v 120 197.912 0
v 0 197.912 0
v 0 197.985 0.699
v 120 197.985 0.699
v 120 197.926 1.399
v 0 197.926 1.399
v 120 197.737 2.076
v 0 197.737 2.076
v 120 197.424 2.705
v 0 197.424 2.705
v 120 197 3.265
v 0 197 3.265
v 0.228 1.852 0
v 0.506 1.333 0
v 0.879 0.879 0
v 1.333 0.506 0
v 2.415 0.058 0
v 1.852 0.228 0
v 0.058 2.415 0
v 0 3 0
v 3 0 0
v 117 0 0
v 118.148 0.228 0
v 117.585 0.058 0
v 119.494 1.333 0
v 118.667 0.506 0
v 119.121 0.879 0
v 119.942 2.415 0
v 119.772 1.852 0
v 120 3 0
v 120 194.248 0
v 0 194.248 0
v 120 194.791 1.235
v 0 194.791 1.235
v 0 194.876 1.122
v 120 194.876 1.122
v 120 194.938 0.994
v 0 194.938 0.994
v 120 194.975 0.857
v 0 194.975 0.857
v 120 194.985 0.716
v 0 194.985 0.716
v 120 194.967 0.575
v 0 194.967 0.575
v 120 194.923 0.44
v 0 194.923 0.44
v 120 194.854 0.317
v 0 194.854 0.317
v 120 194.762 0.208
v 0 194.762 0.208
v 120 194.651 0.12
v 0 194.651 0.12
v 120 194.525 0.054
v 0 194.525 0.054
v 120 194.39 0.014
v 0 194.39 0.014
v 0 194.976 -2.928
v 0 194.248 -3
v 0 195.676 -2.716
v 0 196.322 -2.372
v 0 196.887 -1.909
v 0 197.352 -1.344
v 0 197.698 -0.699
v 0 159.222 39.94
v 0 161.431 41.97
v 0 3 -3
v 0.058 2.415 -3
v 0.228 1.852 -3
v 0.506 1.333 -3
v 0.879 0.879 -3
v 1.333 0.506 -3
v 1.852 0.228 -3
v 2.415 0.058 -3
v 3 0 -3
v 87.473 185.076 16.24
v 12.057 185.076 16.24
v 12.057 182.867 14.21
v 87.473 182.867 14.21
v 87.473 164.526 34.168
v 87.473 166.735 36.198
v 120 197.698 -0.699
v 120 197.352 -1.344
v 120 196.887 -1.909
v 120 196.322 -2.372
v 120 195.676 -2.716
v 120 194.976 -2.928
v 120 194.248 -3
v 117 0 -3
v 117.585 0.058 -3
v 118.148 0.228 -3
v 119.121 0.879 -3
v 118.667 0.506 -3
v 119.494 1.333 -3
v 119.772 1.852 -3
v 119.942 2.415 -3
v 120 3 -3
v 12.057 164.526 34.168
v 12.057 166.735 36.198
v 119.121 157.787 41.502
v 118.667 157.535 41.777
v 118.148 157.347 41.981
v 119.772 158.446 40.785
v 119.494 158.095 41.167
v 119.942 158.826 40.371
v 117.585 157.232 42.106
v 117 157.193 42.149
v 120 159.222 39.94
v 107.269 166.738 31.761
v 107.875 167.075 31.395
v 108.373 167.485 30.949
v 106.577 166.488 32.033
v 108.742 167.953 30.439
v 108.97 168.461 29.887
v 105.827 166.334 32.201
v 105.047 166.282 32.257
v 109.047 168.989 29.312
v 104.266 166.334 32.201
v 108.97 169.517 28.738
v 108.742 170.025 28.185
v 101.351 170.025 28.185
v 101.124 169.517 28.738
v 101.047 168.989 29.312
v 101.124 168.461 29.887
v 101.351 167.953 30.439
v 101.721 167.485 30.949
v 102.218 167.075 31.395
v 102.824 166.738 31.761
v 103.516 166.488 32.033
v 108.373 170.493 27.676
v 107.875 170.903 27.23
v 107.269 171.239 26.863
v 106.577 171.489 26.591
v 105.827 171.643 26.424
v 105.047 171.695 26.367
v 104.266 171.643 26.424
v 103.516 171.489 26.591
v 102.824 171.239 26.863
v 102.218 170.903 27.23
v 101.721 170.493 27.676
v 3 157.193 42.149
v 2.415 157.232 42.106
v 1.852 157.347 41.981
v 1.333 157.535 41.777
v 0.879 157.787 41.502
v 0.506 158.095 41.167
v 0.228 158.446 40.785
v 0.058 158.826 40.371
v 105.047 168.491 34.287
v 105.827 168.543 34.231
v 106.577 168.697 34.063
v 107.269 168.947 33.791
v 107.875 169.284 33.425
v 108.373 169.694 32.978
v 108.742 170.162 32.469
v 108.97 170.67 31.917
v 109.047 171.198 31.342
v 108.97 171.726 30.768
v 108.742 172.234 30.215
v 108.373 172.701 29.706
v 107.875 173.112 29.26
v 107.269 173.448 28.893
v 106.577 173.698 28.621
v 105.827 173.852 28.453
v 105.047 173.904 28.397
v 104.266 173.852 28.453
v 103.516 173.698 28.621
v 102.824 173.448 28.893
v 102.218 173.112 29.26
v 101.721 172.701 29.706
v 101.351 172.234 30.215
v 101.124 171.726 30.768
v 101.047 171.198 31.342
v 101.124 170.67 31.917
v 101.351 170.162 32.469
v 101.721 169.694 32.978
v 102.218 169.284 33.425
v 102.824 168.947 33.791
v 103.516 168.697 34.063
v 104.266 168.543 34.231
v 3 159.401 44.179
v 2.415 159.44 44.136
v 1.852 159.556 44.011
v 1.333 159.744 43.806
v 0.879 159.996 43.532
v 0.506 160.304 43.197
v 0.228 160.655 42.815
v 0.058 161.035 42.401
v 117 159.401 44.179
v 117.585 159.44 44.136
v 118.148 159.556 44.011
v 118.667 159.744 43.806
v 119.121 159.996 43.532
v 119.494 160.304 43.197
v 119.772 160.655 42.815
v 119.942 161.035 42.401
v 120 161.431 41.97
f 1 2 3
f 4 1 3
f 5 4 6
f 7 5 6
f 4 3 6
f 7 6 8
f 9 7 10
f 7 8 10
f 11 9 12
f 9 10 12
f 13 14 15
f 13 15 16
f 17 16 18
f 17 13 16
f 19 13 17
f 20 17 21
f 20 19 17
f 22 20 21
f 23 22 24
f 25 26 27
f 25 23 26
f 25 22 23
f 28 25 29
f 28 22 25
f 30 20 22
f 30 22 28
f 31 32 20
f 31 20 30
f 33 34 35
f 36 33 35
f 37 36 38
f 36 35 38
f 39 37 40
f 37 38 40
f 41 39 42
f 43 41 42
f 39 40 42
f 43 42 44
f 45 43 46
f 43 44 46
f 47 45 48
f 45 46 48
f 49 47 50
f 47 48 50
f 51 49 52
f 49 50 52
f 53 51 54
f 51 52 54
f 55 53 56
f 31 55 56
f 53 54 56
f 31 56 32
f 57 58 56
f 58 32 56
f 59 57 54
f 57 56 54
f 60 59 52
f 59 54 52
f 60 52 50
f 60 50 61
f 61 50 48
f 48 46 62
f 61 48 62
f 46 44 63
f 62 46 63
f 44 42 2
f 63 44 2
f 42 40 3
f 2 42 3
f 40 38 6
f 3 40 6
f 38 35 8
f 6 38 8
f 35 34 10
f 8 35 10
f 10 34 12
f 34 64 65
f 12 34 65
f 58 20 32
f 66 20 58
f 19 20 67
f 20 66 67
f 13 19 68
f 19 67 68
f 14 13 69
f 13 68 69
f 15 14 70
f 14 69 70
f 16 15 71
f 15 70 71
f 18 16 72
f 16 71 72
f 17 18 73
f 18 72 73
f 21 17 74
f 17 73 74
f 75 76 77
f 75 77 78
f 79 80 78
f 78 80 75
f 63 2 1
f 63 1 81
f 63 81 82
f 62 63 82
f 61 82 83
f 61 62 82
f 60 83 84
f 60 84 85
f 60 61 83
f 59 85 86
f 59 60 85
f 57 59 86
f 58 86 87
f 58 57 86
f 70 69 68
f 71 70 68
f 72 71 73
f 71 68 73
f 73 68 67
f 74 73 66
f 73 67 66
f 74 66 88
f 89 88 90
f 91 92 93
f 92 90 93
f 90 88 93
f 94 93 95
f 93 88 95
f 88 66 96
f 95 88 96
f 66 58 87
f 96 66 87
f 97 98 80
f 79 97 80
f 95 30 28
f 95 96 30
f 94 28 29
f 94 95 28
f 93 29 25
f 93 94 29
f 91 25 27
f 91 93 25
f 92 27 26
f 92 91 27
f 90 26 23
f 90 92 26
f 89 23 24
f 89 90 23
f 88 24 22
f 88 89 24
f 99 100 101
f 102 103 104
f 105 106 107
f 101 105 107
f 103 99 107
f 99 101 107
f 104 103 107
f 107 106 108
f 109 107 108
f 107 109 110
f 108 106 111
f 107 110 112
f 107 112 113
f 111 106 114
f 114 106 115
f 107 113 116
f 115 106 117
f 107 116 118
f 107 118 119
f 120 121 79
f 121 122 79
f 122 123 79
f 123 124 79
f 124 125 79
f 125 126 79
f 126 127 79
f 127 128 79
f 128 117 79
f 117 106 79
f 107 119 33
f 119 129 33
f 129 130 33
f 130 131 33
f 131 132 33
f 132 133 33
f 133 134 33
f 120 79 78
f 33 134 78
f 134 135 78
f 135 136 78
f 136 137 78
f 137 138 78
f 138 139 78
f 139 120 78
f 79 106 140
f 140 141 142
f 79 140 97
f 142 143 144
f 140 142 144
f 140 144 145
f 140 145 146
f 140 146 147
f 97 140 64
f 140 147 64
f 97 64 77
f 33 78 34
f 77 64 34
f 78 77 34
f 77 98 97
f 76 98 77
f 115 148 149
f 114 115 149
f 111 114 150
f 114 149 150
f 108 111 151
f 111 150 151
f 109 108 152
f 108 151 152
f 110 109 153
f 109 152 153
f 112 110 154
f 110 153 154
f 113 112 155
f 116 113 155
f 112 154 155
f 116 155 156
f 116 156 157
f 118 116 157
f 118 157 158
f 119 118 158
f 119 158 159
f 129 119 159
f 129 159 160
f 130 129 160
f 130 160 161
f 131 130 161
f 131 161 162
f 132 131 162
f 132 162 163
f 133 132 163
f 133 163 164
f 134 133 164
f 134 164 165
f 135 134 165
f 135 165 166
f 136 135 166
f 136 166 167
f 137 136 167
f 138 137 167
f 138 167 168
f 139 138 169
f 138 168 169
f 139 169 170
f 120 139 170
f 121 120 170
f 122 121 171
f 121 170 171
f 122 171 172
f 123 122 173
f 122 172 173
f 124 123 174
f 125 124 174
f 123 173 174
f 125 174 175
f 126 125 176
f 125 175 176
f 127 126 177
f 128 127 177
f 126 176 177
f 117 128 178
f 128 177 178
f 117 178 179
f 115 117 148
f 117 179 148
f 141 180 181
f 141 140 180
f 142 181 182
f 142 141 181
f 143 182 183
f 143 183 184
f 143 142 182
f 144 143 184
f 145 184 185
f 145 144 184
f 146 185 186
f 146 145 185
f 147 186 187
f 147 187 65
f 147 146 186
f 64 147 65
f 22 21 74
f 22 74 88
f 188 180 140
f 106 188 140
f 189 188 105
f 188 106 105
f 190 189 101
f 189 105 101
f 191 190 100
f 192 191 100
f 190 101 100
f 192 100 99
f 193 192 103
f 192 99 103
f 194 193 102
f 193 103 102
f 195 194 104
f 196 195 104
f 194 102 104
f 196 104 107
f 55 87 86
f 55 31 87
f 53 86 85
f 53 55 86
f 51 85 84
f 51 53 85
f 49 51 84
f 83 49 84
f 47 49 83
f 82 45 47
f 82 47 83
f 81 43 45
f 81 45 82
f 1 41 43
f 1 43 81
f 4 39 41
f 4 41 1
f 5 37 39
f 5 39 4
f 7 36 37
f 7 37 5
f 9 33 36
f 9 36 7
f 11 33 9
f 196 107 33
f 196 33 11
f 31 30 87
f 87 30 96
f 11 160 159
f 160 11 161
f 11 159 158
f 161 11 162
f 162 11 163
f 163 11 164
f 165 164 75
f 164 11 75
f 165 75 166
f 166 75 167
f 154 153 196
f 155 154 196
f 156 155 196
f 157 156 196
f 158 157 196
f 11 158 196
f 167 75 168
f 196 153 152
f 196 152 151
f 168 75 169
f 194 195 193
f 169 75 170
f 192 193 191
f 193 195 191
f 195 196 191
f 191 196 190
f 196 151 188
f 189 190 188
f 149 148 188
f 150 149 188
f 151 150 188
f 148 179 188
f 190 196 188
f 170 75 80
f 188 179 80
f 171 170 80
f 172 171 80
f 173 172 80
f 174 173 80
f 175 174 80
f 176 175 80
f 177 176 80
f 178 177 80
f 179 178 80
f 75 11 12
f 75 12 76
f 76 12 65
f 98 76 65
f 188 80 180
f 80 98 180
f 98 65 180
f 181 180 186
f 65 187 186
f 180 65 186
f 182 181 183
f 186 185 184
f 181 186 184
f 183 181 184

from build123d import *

# Parameters (mm, degrees)
SZKIC1_W                   = 120
SZKIC1_H                   = 200
ODGI_CIE_BAZOWE1_DEPTH     = 3
ODGI_CIE_DOOKOLNE1_DEPTH   = 120
ODGI_CIE_DOOKOLNE1_2_DEPTH = 120
WYTNIJ_WYCI_GNI_CIE1_REACH = 193.554
SZKIC7_R                   = 4
SZKIC7_W                   = 75.41506457
SZKIC7_H                   = 27.105706619
ZAOKR_GLENIE1_R            = 3


# Read off the part's stored shape, not the designer's step: Odgięcie dookolne1
# Sheet-metal steps are written as plain solids
with BuildPart() as part:
    # Szkic1 → Odgięcie bazowe1 (new body)
    with BuildSketch(Plane.XY):
        with Locations((60, 100)):
            Rectangle(SZKIC1_W, SZKIC1_H)
    extrude(amount=-ODGI_CIE_BAZOWE1_DEPTH)

    # Odgięcie dookolne1 outline → Odgięcie dookolne1 (cut)
    with BuildSketch(Plane.YZ):
        with BuildLine():
            Line((200, 0), (197.911617043, 0))
            ThreePointArc((197.911617043, 0), (196.615806823, -2.154295979), (194.248339822, -3))
            Line((194.248339822, -3), (200, -3))
            Line((200, -3), (200, 0))
        make_face()
    extrude(amount=ODGI_CIE_DOOKOLNE1_DEPTH, mode=Mode.SUBTRACT)

    # Odgi_cie dookolne1 2 outline → Odgi_cie dookolne1 2 (add)
    with BuildSketch(Plane.YZ):
        with BuildLine():
            Line((159.401451516, 44.178703704), (157.19251633, 42.14877628))
            Line((157.19251633, 42.14877628), (194.790707041, 1.235014847))
            ThreePointArc((194.790707041, 1.235014847), (194.922769928, 0.440418313), (194.248339822, 0))
            Line((194.248339822, 0), (197.911617043, 0))
            ThreePointArc((197.911617043, 0), (197.847182685, 1.74184107), (196.999642226, 3.264942271))
            Line((196.999642226, 3.264942271), (159.401451516, 44.178703704))
        make_face()
    extrude(amount=ODGI_CIE_DOOKOLNE1_2_DEPTH)

    # Szkic7 → Wytnij-wyciągnięcie1 (cut, up to next)
    with BuildSketch(Plane(origin=(0, 108.430992275, 99.643958017), x_dir=(1, 0, 0), z_dir=(0, 0.7363117283974429, 0.6766424747415508)), mode=Mode.PRIVATE) as wytnij_wyci_gni_cie1_sk1:
        with Locations(Location((105.046682515, 92.762095307, 0), (0, 0, 270))):
            Circle(SZKIC7_R)
    wytnij_wyci_gni_cie1_tool1 = extrude(wytnij_wyci_gni_cie1_sk1.sketch, amount=-WYTNIJ_WYCI_GNI_CIE1_REACH, mode=Mode.PRIVATE) & part.part
    # Szkic7 → Wytnij-wyciągnięcie1 (cut, up to next)
    with BuildSketch(Plane(origin=(0, 108.430992275, 99.643958017), x_dir=(1, 0, 0), z_dir=(0, 0.7363117283974429, 0.6766424747415508)), mode=Mode.PRIVATE) as wytnij_wyci_gni_cie1_sk2:
        with Locations((49.764969339, 99.719590592)):
            Rectangle(SZKIC7_W, SZKIC7_H)
    wytnij_wyci_gni_cie1_tool2 = extrude(wytnij_wyci_gni_cie1_sk2.sketch, amount=-WYTNIJ_WYCI_GNI_CIE1_REACH, mode=Mode.PRIVATE) & part.part
    add(wytnij_wyci_gni_cie1_tool1.solids().sort_by_distance((105.046683, 171.197766, 31.342139))[0], mode=Mode.SUBTRACT)
    add(wytnij_wyci_gni_cie1_tool2.solids().sort_by_distance((49.764969, 175.905503, 26.219254))[0], mode=Mode.SUBTRACT)

    # Zaokrąglenie1
    zaokr_glenie1_edges = [part.edges().sort_by_distance(p)[0] for p in [
        (0, 158.296983923, 43.163739992),
        (120, 158.296983923, 43.163739992),
        (120, 0, -1.5),
        (0, 0, -1.5),
    ]]
    fillet(zaokr_glenie1_edges, radius=ZAOKR_GLENIE1_R)


solid = part.part
